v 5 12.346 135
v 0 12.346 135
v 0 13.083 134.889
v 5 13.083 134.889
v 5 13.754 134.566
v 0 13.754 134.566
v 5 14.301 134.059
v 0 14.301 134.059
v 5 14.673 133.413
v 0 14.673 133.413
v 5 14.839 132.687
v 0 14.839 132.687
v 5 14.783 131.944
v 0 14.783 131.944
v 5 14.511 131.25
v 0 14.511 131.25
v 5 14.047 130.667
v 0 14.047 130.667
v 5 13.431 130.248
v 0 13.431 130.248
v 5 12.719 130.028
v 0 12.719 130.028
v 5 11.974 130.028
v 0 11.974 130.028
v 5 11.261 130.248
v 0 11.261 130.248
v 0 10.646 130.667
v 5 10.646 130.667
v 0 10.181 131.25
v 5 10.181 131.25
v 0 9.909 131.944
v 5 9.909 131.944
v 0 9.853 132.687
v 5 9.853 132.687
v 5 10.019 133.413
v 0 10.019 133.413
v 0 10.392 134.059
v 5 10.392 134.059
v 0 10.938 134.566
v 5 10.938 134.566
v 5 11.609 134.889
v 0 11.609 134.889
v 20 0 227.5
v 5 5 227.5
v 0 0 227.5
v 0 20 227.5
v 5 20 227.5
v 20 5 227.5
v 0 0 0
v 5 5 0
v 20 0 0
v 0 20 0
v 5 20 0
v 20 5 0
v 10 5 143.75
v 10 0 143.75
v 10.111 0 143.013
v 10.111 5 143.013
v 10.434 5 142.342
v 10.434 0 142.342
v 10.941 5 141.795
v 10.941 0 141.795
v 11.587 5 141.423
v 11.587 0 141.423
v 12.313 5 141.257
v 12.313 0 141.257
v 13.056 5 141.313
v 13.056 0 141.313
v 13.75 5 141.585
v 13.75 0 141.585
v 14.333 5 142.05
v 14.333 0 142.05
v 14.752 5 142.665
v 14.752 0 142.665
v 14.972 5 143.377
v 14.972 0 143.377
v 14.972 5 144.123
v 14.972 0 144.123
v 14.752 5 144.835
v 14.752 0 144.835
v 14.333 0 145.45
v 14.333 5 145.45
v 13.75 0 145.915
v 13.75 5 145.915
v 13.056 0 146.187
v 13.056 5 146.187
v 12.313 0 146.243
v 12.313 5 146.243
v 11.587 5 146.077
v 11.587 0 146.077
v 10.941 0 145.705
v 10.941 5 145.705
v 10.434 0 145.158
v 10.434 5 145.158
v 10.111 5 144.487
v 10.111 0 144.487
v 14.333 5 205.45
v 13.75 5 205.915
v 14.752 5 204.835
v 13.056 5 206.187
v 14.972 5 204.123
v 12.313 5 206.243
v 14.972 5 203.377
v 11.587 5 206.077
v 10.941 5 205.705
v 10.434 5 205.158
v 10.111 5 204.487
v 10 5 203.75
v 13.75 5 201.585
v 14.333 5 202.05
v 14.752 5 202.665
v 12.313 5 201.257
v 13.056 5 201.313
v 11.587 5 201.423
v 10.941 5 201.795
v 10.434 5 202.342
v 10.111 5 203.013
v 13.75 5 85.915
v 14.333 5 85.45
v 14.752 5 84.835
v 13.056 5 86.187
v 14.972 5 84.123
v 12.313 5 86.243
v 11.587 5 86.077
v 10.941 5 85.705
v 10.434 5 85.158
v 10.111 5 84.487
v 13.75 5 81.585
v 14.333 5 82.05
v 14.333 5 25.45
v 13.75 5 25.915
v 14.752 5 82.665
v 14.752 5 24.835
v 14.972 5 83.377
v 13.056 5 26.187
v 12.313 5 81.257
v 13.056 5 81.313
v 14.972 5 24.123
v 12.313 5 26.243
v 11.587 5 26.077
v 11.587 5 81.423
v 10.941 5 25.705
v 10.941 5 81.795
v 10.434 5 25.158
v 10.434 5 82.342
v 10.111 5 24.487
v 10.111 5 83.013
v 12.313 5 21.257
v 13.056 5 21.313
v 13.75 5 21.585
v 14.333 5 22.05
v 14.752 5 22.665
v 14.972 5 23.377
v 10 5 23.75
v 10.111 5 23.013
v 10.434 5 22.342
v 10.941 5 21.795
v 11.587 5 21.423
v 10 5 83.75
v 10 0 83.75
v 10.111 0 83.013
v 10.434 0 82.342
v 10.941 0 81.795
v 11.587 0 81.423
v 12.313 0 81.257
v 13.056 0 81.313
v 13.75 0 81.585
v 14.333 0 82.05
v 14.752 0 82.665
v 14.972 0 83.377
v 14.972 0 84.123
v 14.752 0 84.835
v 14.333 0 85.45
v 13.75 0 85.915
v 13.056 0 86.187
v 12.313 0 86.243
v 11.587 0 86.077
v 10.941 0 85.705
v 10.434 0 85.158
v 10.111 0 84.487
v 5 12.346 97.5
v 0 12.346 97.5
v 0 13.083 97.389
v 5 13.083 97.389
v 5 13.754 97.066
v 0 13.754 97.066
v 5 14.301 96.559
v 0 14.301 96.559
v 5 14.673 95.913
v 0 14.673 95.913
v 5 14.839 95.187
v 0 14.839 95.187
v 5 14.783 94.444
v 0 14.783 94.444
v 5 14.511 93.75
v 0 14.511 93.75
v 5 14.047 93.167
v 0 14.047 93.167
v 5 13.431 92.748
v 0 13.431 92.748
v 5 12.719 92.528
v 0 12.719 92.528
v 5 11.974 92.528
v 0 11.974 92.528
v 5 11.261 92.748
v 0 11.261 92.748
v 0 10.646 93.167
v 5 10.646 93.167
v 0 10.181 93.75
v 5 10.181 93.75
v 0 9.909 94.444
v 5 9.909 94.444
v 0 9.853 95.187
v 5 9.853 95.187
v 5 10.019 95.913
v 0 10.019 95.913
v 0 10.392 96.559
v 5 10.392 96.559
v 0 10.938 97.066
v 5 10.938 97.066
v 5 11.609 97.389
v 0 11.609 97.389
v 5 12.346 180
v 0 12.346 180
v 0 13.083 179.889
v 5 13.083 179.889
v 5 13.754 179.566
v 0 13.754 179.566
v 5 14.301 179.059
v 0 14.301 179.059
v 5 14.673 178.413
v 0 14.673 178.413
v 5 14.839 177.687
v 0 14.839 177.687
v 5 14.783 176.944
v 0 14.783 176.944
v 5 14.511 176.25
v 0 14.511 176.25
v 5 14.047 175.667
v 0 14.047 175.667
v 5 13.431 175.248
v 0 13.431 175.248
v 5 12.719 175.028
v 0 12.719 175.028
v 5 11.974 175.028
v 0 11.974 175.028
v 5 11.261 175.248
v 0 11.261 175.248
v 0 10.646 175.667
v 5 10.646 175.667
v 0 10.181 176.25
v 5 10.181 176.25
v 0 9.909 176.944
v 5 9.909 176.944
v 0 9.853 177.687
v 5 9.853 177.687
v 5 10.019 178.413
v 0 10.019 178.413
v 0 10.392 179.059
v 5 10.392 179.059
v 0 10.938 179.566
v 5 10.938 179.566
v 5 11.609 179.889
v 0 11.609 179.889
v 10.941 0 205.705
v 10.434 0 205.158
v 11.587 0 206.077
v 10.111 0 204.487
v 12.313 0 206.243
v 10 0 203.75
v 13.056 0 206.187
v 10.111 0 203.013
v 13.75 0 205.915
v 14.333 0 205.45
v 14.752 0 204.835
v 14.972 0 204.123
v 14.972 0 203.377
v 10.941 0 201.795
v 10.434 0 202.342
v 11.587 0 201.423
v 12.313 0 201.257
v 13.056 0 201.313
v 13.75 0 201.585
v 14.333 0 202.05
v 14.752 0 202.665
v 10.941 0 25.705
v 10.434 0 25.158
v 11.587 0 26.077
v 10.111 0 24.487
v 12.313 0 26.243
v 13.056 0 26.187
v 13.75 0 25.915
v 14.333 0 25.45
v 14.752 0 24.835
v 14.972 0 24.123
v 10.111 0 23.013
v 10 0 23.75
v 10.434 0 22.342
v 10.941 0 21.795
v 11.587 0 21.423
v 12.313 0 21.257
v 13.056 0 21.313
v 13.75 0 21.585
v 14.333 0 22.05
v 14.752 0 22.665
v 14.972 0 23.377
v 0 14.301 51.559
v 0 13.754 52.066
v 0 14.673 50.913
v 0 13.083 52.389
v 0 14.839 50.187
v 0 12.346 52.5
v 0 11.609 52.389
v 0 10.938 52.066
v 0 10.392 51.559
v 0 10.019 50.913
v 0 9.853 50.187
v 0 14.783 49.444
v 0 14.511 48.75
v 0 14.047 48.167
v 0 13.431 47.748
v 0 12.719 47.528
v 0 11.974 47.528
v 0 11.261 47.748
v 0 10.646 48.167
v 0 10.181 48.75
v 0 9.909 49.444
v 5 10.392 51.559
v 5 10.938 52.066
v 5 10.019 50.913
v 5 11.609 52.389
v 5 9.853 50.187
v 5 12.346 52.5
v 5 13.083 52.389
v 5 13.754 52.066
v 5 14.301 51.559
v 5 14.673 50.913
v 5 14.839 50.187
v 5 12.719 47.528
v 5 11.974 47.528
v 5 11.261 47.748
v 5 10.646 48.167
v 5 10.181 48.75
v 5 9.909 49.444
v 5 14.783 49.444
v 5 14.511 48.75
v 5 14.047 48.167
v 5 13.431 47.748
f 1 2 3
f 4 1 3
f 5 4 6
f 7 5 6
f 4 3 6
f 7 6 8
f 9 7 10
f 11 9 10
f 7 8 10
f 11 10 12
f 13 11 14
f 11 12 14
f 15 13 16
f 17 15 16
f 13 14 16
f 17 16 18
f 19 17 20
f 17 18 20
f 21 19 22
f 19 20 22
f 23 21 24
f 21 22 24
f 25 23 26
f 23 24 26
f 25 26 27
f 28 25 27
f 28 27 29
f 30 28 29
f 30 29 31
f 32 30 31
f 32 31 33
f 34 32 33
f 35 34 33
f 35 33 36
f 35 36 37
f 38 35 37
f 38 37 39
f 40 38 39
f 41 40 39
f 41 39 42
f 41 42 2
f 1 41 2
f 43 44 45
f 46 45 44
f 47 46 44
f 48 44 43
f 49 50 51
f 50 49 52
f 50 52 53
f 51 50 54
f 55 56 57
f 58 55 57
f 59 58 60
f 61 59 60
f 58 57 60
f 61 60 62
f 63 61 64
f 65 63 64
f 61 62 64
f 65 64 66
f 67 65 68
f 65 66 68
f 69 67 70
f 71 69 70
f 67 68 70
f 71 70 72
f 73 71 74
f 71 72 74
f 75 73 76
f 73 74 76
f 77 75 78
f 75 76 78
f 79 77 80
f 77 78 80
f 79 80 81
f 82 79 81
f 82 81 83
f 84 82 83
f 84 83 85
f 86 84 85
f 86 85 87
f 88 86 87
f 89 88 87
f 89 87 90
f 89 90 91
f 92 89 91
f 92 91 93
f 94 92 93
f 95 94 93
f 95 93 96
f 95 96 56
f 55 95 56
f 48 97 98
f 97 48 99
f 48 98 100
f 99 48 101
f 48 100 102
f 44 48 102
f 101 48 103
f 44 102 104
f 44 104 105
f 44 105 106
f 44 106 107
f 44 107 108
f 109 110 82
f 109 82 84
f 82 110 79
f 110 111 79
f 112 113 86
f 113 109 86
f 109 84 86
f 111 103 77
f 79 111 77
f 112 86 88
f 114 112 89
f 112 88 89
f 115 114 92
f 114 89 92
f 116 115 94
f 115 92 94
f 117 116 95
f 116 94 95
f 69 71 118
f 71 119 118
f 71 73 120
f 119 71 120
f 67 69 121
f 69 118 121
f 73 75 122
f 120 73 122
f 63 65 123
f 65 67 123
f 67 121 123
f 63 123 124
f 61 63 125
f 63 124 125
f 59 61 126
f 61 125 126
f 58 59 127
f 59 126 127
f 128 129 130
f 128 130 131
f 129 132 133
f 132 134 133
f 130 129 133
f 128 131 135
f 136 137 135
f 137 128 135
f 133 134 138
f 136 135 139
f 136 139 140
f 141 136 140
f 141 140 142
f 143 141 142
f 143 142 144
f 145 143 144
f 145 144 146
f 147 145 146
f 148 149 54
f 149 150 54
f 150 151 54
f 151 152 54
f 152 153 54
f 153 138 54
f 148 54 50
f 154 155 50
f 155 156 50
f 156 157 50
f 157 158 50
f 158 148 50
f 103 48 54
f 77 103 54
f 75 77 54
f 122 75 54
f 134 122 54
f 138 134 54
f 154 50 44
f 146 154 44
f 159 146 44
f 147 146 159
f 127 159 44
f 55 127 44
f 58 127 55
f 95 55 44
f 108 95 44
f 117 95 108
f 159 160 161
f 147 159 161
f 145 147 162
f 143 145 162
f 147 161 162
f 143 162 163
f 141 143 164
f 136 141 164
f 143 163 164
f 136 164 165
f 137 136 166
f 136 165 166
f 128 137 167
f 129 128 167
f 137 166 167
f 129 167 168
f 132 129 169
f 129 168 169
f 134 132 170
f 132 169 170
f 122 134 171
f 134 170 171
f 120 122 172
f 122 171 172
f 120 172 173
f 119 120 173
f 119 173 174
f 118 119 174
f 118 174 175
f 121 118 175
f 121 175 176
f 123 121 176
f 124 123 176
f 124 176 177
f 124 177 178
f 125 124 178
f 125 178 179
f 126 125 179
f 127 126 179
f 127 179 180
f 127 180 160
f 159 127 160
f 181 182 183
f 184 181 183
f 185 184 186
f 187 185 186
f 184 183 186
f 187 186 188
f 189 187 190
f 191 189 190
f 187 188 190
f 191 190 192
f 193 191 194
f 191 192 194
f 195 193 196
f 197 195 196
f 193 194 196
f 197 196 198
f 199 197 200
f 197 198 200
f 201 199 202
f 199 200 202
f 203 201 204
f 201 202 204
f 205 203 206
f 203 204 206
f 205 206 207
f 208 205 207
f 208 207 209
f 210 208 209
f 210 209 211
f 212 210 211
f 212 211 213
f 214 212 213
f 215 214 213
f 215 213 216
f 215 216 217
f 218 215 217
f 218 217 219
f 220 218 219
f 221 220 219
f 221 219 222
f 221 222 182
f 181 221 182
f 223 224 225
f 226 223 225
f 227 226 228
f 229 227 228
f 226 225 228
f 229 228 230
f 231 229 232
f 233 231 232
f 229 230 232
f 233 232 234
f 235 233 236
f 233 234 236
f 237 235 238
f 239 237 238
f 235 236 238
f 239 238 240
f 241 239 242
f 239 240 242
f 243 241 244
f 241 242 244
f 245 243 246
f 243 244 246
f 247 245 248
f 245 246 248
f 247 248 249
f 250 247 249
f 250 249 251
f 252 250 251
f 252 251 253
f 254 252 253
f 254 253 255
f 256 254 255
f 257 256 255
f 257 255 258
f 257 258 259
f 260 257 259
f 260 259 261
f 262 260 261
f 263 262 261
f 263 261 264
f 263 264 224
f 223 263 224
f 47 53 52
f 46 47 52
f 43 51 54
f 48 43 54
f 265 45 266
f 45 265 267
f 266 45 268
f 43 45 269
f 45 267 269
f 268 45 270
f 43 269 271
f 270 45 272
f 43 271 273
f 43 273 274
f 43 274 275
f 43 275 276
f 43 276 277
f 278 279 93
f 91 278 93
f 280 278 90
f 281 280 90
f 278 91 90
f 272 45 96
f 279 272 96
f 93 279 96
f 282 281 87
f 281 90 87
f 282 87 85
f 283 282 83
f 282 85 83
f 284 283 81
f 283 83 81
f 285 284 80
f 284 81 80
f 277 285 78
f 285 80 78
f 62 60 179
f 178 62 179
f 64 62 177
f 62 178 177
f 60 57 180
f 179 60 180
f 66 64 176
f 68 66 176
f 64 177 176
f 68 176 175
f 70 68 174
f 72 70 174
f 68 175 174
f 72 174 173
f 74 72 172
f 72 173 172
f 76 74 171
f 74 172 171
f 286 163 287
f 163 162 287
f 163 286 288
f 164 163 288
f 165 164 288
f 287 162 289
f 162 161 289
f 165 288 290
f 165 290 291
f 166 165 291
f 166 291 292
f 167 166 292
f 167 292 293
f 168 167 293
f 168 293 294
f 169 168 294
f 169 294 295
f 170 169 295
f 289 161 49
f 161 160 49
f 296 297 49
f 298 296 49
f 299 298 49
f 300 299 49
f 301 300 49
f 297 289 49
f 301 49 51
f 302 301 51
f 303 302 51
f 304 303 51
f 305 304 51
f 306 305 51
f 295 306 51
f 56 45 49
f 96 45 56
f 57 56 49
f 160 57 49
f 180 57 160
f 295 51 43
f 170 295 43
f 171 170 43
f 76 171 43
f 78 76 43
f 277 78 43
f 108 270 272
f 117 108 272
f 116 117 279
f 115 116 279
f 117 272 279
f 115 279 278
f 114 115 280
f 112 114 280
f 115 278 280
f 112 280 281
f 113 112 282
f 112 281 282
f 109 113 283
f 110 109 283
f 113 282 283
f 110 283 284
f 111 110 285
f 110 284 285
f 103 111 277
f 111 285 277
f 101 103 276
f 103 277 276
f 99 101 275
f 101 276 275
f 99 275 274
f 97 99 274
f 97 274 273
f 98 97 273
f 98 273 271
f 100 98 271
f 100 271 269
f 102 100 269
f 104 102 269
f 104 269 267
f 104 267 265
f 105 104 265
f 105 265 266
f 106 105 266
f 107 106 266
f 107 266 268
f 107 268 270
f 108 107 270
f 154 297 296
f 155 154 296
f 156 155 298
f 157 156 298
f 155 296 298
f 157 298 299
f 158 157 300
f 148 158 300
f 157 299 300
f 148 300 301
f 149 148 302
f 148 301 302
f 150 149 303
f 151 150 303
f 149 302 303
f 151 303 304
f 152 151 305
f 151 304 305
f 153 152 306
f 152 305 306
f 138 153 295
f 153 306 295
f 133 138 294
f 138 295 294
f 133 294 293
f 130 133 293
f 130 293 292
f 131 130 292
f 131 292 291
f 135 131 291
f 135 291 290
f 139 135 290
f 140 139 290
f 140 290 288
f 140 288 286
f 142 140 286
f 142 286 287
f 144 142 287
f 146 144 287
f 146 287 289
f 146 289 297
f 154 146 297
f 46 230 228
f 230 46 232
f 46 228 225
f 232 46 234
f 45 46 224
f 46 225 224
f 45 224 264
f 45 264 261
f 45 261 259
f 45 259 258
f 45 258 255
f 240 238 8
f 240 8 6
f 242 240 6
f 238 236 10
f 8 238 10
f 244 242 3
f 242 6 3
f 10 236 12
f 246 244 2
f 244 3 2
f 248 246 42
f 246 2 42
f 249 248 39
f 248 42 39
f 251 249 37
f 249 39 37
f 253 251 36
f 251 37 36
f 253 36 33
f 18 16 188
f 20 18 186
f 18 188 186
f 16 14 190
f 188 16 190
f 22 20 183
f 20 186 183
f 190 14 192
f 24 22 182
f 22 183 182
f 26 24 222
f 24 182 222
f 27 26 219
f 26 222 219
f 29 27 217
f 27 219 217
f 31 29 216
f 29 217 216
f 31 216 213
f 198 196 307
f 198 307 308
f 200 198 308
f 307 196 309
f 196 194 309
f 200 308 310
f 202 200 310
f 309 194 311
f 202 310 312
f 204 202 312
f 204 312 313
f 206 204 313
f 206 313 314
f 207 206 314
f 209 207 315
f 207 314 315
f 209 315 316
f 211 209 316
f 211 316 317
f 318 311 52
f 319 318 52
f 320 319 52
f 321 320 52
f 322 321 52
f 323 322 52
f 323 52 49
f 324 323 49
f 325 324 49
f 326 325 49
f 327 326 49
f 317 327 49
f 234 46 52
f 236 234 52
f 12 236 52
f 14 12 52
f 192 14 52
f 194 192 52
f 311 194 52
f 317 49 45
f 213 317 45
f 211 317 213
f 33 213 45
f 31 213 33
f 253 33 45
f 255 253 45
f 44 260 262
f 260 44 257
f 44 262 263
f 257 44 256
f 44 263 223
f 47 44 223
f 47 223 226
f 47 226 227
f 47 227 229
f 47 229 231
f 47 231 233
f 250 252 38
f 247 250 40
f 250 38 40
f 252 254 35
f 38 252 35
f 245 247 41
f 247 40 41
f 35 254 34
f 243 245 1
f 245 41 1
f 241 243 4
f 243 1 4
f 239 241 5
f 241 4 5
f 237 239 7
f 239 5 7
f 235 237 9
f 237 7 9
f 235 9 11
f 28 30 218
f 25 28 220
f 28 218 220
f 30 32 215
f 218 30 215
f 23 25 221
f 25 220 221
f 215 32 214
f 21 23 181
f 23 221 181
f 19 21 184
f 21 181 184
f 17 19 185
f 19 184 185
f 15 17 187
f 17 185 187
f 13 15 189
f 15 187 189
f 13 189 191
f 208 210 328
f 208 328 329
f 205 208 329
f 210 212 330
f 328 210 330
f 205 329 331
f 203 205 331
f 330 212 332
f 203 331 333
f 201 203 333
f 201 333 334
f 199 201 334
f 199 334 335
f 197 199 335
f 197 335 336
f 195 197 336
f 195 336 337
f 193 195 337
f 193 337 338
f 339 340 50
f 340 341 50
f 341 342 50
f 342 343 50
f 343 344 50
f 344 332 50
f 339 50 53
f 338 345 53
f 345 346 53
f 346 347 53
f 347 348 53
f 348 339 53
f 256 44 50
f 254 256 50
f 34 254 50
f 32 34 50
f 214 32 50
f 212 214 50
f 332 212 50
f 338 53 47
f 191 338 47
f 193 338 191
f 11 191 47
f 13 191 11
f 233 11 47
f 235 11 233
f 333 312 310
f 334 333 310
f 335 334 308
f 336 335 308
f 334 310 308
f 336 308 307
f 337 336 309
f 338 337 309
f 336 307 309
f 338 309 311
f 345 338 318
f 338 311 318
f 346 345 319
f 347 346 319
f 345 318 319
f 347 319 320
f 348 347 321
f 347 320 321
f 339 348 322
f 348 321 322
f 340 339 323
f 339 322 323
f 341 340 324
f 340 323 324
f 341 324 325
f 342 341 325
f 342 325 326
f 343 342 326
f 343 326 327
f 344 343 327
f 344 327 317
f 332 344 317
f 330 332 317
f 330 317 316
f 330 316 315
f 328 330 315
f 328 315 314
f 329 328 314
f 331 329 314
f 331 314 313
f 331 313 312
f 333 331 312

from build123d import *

# Parameters (mm, degrees)
BOSS_EXTRUDE1_DEPTH         = 227.5
TAP_DRILL_FOR_M5X0_8_TAP1_D = 5
F_5_0_5_DIAMETER_HOLE1_D    = 5


with BuildPart() as part:
    # Sketch1 → Boss-Extrude1 (new body)
    with BuildSketch(Plane.XY):
        Polygon((0, 5), (0, 0), (5, 0), (20, 0), (20, 5), (5, 5), (5, 20), (0, 20), align=None)
    extrude(amount=BOSS_EXTRUDE1_DEPTH)

    # Tap Drill for M5x0.8 Tap1 (through all)
    with Locations(Plane(origin=(0, 5, 0), x_dir=(1, 0, 0), z_dir=(0, 1, 0))):
        with Locations((12.5, -203.75), (12.5, -143.75), (12.5, -83.75), (12.5, -23.75)):
            Hole(TAP_DRILL_FOR_M5X0_8_TAP1_D / 2)

    # Ø5.0 (5) Diameter Hole1 (through all)
    with Locations(Plane(origin=(5, 0, 0), x_dir=(0, 0, -1), z_dir=(1, 0, 0))):
        with Locations((-177.5, 12.346163158), (-132.5, 12.346163158), (-95, 12.346163158), (-50, 12.346163158)):
            Hole(F_5_0_5_DIAMETER_HOLE1_D / 2)


solid = part.part
